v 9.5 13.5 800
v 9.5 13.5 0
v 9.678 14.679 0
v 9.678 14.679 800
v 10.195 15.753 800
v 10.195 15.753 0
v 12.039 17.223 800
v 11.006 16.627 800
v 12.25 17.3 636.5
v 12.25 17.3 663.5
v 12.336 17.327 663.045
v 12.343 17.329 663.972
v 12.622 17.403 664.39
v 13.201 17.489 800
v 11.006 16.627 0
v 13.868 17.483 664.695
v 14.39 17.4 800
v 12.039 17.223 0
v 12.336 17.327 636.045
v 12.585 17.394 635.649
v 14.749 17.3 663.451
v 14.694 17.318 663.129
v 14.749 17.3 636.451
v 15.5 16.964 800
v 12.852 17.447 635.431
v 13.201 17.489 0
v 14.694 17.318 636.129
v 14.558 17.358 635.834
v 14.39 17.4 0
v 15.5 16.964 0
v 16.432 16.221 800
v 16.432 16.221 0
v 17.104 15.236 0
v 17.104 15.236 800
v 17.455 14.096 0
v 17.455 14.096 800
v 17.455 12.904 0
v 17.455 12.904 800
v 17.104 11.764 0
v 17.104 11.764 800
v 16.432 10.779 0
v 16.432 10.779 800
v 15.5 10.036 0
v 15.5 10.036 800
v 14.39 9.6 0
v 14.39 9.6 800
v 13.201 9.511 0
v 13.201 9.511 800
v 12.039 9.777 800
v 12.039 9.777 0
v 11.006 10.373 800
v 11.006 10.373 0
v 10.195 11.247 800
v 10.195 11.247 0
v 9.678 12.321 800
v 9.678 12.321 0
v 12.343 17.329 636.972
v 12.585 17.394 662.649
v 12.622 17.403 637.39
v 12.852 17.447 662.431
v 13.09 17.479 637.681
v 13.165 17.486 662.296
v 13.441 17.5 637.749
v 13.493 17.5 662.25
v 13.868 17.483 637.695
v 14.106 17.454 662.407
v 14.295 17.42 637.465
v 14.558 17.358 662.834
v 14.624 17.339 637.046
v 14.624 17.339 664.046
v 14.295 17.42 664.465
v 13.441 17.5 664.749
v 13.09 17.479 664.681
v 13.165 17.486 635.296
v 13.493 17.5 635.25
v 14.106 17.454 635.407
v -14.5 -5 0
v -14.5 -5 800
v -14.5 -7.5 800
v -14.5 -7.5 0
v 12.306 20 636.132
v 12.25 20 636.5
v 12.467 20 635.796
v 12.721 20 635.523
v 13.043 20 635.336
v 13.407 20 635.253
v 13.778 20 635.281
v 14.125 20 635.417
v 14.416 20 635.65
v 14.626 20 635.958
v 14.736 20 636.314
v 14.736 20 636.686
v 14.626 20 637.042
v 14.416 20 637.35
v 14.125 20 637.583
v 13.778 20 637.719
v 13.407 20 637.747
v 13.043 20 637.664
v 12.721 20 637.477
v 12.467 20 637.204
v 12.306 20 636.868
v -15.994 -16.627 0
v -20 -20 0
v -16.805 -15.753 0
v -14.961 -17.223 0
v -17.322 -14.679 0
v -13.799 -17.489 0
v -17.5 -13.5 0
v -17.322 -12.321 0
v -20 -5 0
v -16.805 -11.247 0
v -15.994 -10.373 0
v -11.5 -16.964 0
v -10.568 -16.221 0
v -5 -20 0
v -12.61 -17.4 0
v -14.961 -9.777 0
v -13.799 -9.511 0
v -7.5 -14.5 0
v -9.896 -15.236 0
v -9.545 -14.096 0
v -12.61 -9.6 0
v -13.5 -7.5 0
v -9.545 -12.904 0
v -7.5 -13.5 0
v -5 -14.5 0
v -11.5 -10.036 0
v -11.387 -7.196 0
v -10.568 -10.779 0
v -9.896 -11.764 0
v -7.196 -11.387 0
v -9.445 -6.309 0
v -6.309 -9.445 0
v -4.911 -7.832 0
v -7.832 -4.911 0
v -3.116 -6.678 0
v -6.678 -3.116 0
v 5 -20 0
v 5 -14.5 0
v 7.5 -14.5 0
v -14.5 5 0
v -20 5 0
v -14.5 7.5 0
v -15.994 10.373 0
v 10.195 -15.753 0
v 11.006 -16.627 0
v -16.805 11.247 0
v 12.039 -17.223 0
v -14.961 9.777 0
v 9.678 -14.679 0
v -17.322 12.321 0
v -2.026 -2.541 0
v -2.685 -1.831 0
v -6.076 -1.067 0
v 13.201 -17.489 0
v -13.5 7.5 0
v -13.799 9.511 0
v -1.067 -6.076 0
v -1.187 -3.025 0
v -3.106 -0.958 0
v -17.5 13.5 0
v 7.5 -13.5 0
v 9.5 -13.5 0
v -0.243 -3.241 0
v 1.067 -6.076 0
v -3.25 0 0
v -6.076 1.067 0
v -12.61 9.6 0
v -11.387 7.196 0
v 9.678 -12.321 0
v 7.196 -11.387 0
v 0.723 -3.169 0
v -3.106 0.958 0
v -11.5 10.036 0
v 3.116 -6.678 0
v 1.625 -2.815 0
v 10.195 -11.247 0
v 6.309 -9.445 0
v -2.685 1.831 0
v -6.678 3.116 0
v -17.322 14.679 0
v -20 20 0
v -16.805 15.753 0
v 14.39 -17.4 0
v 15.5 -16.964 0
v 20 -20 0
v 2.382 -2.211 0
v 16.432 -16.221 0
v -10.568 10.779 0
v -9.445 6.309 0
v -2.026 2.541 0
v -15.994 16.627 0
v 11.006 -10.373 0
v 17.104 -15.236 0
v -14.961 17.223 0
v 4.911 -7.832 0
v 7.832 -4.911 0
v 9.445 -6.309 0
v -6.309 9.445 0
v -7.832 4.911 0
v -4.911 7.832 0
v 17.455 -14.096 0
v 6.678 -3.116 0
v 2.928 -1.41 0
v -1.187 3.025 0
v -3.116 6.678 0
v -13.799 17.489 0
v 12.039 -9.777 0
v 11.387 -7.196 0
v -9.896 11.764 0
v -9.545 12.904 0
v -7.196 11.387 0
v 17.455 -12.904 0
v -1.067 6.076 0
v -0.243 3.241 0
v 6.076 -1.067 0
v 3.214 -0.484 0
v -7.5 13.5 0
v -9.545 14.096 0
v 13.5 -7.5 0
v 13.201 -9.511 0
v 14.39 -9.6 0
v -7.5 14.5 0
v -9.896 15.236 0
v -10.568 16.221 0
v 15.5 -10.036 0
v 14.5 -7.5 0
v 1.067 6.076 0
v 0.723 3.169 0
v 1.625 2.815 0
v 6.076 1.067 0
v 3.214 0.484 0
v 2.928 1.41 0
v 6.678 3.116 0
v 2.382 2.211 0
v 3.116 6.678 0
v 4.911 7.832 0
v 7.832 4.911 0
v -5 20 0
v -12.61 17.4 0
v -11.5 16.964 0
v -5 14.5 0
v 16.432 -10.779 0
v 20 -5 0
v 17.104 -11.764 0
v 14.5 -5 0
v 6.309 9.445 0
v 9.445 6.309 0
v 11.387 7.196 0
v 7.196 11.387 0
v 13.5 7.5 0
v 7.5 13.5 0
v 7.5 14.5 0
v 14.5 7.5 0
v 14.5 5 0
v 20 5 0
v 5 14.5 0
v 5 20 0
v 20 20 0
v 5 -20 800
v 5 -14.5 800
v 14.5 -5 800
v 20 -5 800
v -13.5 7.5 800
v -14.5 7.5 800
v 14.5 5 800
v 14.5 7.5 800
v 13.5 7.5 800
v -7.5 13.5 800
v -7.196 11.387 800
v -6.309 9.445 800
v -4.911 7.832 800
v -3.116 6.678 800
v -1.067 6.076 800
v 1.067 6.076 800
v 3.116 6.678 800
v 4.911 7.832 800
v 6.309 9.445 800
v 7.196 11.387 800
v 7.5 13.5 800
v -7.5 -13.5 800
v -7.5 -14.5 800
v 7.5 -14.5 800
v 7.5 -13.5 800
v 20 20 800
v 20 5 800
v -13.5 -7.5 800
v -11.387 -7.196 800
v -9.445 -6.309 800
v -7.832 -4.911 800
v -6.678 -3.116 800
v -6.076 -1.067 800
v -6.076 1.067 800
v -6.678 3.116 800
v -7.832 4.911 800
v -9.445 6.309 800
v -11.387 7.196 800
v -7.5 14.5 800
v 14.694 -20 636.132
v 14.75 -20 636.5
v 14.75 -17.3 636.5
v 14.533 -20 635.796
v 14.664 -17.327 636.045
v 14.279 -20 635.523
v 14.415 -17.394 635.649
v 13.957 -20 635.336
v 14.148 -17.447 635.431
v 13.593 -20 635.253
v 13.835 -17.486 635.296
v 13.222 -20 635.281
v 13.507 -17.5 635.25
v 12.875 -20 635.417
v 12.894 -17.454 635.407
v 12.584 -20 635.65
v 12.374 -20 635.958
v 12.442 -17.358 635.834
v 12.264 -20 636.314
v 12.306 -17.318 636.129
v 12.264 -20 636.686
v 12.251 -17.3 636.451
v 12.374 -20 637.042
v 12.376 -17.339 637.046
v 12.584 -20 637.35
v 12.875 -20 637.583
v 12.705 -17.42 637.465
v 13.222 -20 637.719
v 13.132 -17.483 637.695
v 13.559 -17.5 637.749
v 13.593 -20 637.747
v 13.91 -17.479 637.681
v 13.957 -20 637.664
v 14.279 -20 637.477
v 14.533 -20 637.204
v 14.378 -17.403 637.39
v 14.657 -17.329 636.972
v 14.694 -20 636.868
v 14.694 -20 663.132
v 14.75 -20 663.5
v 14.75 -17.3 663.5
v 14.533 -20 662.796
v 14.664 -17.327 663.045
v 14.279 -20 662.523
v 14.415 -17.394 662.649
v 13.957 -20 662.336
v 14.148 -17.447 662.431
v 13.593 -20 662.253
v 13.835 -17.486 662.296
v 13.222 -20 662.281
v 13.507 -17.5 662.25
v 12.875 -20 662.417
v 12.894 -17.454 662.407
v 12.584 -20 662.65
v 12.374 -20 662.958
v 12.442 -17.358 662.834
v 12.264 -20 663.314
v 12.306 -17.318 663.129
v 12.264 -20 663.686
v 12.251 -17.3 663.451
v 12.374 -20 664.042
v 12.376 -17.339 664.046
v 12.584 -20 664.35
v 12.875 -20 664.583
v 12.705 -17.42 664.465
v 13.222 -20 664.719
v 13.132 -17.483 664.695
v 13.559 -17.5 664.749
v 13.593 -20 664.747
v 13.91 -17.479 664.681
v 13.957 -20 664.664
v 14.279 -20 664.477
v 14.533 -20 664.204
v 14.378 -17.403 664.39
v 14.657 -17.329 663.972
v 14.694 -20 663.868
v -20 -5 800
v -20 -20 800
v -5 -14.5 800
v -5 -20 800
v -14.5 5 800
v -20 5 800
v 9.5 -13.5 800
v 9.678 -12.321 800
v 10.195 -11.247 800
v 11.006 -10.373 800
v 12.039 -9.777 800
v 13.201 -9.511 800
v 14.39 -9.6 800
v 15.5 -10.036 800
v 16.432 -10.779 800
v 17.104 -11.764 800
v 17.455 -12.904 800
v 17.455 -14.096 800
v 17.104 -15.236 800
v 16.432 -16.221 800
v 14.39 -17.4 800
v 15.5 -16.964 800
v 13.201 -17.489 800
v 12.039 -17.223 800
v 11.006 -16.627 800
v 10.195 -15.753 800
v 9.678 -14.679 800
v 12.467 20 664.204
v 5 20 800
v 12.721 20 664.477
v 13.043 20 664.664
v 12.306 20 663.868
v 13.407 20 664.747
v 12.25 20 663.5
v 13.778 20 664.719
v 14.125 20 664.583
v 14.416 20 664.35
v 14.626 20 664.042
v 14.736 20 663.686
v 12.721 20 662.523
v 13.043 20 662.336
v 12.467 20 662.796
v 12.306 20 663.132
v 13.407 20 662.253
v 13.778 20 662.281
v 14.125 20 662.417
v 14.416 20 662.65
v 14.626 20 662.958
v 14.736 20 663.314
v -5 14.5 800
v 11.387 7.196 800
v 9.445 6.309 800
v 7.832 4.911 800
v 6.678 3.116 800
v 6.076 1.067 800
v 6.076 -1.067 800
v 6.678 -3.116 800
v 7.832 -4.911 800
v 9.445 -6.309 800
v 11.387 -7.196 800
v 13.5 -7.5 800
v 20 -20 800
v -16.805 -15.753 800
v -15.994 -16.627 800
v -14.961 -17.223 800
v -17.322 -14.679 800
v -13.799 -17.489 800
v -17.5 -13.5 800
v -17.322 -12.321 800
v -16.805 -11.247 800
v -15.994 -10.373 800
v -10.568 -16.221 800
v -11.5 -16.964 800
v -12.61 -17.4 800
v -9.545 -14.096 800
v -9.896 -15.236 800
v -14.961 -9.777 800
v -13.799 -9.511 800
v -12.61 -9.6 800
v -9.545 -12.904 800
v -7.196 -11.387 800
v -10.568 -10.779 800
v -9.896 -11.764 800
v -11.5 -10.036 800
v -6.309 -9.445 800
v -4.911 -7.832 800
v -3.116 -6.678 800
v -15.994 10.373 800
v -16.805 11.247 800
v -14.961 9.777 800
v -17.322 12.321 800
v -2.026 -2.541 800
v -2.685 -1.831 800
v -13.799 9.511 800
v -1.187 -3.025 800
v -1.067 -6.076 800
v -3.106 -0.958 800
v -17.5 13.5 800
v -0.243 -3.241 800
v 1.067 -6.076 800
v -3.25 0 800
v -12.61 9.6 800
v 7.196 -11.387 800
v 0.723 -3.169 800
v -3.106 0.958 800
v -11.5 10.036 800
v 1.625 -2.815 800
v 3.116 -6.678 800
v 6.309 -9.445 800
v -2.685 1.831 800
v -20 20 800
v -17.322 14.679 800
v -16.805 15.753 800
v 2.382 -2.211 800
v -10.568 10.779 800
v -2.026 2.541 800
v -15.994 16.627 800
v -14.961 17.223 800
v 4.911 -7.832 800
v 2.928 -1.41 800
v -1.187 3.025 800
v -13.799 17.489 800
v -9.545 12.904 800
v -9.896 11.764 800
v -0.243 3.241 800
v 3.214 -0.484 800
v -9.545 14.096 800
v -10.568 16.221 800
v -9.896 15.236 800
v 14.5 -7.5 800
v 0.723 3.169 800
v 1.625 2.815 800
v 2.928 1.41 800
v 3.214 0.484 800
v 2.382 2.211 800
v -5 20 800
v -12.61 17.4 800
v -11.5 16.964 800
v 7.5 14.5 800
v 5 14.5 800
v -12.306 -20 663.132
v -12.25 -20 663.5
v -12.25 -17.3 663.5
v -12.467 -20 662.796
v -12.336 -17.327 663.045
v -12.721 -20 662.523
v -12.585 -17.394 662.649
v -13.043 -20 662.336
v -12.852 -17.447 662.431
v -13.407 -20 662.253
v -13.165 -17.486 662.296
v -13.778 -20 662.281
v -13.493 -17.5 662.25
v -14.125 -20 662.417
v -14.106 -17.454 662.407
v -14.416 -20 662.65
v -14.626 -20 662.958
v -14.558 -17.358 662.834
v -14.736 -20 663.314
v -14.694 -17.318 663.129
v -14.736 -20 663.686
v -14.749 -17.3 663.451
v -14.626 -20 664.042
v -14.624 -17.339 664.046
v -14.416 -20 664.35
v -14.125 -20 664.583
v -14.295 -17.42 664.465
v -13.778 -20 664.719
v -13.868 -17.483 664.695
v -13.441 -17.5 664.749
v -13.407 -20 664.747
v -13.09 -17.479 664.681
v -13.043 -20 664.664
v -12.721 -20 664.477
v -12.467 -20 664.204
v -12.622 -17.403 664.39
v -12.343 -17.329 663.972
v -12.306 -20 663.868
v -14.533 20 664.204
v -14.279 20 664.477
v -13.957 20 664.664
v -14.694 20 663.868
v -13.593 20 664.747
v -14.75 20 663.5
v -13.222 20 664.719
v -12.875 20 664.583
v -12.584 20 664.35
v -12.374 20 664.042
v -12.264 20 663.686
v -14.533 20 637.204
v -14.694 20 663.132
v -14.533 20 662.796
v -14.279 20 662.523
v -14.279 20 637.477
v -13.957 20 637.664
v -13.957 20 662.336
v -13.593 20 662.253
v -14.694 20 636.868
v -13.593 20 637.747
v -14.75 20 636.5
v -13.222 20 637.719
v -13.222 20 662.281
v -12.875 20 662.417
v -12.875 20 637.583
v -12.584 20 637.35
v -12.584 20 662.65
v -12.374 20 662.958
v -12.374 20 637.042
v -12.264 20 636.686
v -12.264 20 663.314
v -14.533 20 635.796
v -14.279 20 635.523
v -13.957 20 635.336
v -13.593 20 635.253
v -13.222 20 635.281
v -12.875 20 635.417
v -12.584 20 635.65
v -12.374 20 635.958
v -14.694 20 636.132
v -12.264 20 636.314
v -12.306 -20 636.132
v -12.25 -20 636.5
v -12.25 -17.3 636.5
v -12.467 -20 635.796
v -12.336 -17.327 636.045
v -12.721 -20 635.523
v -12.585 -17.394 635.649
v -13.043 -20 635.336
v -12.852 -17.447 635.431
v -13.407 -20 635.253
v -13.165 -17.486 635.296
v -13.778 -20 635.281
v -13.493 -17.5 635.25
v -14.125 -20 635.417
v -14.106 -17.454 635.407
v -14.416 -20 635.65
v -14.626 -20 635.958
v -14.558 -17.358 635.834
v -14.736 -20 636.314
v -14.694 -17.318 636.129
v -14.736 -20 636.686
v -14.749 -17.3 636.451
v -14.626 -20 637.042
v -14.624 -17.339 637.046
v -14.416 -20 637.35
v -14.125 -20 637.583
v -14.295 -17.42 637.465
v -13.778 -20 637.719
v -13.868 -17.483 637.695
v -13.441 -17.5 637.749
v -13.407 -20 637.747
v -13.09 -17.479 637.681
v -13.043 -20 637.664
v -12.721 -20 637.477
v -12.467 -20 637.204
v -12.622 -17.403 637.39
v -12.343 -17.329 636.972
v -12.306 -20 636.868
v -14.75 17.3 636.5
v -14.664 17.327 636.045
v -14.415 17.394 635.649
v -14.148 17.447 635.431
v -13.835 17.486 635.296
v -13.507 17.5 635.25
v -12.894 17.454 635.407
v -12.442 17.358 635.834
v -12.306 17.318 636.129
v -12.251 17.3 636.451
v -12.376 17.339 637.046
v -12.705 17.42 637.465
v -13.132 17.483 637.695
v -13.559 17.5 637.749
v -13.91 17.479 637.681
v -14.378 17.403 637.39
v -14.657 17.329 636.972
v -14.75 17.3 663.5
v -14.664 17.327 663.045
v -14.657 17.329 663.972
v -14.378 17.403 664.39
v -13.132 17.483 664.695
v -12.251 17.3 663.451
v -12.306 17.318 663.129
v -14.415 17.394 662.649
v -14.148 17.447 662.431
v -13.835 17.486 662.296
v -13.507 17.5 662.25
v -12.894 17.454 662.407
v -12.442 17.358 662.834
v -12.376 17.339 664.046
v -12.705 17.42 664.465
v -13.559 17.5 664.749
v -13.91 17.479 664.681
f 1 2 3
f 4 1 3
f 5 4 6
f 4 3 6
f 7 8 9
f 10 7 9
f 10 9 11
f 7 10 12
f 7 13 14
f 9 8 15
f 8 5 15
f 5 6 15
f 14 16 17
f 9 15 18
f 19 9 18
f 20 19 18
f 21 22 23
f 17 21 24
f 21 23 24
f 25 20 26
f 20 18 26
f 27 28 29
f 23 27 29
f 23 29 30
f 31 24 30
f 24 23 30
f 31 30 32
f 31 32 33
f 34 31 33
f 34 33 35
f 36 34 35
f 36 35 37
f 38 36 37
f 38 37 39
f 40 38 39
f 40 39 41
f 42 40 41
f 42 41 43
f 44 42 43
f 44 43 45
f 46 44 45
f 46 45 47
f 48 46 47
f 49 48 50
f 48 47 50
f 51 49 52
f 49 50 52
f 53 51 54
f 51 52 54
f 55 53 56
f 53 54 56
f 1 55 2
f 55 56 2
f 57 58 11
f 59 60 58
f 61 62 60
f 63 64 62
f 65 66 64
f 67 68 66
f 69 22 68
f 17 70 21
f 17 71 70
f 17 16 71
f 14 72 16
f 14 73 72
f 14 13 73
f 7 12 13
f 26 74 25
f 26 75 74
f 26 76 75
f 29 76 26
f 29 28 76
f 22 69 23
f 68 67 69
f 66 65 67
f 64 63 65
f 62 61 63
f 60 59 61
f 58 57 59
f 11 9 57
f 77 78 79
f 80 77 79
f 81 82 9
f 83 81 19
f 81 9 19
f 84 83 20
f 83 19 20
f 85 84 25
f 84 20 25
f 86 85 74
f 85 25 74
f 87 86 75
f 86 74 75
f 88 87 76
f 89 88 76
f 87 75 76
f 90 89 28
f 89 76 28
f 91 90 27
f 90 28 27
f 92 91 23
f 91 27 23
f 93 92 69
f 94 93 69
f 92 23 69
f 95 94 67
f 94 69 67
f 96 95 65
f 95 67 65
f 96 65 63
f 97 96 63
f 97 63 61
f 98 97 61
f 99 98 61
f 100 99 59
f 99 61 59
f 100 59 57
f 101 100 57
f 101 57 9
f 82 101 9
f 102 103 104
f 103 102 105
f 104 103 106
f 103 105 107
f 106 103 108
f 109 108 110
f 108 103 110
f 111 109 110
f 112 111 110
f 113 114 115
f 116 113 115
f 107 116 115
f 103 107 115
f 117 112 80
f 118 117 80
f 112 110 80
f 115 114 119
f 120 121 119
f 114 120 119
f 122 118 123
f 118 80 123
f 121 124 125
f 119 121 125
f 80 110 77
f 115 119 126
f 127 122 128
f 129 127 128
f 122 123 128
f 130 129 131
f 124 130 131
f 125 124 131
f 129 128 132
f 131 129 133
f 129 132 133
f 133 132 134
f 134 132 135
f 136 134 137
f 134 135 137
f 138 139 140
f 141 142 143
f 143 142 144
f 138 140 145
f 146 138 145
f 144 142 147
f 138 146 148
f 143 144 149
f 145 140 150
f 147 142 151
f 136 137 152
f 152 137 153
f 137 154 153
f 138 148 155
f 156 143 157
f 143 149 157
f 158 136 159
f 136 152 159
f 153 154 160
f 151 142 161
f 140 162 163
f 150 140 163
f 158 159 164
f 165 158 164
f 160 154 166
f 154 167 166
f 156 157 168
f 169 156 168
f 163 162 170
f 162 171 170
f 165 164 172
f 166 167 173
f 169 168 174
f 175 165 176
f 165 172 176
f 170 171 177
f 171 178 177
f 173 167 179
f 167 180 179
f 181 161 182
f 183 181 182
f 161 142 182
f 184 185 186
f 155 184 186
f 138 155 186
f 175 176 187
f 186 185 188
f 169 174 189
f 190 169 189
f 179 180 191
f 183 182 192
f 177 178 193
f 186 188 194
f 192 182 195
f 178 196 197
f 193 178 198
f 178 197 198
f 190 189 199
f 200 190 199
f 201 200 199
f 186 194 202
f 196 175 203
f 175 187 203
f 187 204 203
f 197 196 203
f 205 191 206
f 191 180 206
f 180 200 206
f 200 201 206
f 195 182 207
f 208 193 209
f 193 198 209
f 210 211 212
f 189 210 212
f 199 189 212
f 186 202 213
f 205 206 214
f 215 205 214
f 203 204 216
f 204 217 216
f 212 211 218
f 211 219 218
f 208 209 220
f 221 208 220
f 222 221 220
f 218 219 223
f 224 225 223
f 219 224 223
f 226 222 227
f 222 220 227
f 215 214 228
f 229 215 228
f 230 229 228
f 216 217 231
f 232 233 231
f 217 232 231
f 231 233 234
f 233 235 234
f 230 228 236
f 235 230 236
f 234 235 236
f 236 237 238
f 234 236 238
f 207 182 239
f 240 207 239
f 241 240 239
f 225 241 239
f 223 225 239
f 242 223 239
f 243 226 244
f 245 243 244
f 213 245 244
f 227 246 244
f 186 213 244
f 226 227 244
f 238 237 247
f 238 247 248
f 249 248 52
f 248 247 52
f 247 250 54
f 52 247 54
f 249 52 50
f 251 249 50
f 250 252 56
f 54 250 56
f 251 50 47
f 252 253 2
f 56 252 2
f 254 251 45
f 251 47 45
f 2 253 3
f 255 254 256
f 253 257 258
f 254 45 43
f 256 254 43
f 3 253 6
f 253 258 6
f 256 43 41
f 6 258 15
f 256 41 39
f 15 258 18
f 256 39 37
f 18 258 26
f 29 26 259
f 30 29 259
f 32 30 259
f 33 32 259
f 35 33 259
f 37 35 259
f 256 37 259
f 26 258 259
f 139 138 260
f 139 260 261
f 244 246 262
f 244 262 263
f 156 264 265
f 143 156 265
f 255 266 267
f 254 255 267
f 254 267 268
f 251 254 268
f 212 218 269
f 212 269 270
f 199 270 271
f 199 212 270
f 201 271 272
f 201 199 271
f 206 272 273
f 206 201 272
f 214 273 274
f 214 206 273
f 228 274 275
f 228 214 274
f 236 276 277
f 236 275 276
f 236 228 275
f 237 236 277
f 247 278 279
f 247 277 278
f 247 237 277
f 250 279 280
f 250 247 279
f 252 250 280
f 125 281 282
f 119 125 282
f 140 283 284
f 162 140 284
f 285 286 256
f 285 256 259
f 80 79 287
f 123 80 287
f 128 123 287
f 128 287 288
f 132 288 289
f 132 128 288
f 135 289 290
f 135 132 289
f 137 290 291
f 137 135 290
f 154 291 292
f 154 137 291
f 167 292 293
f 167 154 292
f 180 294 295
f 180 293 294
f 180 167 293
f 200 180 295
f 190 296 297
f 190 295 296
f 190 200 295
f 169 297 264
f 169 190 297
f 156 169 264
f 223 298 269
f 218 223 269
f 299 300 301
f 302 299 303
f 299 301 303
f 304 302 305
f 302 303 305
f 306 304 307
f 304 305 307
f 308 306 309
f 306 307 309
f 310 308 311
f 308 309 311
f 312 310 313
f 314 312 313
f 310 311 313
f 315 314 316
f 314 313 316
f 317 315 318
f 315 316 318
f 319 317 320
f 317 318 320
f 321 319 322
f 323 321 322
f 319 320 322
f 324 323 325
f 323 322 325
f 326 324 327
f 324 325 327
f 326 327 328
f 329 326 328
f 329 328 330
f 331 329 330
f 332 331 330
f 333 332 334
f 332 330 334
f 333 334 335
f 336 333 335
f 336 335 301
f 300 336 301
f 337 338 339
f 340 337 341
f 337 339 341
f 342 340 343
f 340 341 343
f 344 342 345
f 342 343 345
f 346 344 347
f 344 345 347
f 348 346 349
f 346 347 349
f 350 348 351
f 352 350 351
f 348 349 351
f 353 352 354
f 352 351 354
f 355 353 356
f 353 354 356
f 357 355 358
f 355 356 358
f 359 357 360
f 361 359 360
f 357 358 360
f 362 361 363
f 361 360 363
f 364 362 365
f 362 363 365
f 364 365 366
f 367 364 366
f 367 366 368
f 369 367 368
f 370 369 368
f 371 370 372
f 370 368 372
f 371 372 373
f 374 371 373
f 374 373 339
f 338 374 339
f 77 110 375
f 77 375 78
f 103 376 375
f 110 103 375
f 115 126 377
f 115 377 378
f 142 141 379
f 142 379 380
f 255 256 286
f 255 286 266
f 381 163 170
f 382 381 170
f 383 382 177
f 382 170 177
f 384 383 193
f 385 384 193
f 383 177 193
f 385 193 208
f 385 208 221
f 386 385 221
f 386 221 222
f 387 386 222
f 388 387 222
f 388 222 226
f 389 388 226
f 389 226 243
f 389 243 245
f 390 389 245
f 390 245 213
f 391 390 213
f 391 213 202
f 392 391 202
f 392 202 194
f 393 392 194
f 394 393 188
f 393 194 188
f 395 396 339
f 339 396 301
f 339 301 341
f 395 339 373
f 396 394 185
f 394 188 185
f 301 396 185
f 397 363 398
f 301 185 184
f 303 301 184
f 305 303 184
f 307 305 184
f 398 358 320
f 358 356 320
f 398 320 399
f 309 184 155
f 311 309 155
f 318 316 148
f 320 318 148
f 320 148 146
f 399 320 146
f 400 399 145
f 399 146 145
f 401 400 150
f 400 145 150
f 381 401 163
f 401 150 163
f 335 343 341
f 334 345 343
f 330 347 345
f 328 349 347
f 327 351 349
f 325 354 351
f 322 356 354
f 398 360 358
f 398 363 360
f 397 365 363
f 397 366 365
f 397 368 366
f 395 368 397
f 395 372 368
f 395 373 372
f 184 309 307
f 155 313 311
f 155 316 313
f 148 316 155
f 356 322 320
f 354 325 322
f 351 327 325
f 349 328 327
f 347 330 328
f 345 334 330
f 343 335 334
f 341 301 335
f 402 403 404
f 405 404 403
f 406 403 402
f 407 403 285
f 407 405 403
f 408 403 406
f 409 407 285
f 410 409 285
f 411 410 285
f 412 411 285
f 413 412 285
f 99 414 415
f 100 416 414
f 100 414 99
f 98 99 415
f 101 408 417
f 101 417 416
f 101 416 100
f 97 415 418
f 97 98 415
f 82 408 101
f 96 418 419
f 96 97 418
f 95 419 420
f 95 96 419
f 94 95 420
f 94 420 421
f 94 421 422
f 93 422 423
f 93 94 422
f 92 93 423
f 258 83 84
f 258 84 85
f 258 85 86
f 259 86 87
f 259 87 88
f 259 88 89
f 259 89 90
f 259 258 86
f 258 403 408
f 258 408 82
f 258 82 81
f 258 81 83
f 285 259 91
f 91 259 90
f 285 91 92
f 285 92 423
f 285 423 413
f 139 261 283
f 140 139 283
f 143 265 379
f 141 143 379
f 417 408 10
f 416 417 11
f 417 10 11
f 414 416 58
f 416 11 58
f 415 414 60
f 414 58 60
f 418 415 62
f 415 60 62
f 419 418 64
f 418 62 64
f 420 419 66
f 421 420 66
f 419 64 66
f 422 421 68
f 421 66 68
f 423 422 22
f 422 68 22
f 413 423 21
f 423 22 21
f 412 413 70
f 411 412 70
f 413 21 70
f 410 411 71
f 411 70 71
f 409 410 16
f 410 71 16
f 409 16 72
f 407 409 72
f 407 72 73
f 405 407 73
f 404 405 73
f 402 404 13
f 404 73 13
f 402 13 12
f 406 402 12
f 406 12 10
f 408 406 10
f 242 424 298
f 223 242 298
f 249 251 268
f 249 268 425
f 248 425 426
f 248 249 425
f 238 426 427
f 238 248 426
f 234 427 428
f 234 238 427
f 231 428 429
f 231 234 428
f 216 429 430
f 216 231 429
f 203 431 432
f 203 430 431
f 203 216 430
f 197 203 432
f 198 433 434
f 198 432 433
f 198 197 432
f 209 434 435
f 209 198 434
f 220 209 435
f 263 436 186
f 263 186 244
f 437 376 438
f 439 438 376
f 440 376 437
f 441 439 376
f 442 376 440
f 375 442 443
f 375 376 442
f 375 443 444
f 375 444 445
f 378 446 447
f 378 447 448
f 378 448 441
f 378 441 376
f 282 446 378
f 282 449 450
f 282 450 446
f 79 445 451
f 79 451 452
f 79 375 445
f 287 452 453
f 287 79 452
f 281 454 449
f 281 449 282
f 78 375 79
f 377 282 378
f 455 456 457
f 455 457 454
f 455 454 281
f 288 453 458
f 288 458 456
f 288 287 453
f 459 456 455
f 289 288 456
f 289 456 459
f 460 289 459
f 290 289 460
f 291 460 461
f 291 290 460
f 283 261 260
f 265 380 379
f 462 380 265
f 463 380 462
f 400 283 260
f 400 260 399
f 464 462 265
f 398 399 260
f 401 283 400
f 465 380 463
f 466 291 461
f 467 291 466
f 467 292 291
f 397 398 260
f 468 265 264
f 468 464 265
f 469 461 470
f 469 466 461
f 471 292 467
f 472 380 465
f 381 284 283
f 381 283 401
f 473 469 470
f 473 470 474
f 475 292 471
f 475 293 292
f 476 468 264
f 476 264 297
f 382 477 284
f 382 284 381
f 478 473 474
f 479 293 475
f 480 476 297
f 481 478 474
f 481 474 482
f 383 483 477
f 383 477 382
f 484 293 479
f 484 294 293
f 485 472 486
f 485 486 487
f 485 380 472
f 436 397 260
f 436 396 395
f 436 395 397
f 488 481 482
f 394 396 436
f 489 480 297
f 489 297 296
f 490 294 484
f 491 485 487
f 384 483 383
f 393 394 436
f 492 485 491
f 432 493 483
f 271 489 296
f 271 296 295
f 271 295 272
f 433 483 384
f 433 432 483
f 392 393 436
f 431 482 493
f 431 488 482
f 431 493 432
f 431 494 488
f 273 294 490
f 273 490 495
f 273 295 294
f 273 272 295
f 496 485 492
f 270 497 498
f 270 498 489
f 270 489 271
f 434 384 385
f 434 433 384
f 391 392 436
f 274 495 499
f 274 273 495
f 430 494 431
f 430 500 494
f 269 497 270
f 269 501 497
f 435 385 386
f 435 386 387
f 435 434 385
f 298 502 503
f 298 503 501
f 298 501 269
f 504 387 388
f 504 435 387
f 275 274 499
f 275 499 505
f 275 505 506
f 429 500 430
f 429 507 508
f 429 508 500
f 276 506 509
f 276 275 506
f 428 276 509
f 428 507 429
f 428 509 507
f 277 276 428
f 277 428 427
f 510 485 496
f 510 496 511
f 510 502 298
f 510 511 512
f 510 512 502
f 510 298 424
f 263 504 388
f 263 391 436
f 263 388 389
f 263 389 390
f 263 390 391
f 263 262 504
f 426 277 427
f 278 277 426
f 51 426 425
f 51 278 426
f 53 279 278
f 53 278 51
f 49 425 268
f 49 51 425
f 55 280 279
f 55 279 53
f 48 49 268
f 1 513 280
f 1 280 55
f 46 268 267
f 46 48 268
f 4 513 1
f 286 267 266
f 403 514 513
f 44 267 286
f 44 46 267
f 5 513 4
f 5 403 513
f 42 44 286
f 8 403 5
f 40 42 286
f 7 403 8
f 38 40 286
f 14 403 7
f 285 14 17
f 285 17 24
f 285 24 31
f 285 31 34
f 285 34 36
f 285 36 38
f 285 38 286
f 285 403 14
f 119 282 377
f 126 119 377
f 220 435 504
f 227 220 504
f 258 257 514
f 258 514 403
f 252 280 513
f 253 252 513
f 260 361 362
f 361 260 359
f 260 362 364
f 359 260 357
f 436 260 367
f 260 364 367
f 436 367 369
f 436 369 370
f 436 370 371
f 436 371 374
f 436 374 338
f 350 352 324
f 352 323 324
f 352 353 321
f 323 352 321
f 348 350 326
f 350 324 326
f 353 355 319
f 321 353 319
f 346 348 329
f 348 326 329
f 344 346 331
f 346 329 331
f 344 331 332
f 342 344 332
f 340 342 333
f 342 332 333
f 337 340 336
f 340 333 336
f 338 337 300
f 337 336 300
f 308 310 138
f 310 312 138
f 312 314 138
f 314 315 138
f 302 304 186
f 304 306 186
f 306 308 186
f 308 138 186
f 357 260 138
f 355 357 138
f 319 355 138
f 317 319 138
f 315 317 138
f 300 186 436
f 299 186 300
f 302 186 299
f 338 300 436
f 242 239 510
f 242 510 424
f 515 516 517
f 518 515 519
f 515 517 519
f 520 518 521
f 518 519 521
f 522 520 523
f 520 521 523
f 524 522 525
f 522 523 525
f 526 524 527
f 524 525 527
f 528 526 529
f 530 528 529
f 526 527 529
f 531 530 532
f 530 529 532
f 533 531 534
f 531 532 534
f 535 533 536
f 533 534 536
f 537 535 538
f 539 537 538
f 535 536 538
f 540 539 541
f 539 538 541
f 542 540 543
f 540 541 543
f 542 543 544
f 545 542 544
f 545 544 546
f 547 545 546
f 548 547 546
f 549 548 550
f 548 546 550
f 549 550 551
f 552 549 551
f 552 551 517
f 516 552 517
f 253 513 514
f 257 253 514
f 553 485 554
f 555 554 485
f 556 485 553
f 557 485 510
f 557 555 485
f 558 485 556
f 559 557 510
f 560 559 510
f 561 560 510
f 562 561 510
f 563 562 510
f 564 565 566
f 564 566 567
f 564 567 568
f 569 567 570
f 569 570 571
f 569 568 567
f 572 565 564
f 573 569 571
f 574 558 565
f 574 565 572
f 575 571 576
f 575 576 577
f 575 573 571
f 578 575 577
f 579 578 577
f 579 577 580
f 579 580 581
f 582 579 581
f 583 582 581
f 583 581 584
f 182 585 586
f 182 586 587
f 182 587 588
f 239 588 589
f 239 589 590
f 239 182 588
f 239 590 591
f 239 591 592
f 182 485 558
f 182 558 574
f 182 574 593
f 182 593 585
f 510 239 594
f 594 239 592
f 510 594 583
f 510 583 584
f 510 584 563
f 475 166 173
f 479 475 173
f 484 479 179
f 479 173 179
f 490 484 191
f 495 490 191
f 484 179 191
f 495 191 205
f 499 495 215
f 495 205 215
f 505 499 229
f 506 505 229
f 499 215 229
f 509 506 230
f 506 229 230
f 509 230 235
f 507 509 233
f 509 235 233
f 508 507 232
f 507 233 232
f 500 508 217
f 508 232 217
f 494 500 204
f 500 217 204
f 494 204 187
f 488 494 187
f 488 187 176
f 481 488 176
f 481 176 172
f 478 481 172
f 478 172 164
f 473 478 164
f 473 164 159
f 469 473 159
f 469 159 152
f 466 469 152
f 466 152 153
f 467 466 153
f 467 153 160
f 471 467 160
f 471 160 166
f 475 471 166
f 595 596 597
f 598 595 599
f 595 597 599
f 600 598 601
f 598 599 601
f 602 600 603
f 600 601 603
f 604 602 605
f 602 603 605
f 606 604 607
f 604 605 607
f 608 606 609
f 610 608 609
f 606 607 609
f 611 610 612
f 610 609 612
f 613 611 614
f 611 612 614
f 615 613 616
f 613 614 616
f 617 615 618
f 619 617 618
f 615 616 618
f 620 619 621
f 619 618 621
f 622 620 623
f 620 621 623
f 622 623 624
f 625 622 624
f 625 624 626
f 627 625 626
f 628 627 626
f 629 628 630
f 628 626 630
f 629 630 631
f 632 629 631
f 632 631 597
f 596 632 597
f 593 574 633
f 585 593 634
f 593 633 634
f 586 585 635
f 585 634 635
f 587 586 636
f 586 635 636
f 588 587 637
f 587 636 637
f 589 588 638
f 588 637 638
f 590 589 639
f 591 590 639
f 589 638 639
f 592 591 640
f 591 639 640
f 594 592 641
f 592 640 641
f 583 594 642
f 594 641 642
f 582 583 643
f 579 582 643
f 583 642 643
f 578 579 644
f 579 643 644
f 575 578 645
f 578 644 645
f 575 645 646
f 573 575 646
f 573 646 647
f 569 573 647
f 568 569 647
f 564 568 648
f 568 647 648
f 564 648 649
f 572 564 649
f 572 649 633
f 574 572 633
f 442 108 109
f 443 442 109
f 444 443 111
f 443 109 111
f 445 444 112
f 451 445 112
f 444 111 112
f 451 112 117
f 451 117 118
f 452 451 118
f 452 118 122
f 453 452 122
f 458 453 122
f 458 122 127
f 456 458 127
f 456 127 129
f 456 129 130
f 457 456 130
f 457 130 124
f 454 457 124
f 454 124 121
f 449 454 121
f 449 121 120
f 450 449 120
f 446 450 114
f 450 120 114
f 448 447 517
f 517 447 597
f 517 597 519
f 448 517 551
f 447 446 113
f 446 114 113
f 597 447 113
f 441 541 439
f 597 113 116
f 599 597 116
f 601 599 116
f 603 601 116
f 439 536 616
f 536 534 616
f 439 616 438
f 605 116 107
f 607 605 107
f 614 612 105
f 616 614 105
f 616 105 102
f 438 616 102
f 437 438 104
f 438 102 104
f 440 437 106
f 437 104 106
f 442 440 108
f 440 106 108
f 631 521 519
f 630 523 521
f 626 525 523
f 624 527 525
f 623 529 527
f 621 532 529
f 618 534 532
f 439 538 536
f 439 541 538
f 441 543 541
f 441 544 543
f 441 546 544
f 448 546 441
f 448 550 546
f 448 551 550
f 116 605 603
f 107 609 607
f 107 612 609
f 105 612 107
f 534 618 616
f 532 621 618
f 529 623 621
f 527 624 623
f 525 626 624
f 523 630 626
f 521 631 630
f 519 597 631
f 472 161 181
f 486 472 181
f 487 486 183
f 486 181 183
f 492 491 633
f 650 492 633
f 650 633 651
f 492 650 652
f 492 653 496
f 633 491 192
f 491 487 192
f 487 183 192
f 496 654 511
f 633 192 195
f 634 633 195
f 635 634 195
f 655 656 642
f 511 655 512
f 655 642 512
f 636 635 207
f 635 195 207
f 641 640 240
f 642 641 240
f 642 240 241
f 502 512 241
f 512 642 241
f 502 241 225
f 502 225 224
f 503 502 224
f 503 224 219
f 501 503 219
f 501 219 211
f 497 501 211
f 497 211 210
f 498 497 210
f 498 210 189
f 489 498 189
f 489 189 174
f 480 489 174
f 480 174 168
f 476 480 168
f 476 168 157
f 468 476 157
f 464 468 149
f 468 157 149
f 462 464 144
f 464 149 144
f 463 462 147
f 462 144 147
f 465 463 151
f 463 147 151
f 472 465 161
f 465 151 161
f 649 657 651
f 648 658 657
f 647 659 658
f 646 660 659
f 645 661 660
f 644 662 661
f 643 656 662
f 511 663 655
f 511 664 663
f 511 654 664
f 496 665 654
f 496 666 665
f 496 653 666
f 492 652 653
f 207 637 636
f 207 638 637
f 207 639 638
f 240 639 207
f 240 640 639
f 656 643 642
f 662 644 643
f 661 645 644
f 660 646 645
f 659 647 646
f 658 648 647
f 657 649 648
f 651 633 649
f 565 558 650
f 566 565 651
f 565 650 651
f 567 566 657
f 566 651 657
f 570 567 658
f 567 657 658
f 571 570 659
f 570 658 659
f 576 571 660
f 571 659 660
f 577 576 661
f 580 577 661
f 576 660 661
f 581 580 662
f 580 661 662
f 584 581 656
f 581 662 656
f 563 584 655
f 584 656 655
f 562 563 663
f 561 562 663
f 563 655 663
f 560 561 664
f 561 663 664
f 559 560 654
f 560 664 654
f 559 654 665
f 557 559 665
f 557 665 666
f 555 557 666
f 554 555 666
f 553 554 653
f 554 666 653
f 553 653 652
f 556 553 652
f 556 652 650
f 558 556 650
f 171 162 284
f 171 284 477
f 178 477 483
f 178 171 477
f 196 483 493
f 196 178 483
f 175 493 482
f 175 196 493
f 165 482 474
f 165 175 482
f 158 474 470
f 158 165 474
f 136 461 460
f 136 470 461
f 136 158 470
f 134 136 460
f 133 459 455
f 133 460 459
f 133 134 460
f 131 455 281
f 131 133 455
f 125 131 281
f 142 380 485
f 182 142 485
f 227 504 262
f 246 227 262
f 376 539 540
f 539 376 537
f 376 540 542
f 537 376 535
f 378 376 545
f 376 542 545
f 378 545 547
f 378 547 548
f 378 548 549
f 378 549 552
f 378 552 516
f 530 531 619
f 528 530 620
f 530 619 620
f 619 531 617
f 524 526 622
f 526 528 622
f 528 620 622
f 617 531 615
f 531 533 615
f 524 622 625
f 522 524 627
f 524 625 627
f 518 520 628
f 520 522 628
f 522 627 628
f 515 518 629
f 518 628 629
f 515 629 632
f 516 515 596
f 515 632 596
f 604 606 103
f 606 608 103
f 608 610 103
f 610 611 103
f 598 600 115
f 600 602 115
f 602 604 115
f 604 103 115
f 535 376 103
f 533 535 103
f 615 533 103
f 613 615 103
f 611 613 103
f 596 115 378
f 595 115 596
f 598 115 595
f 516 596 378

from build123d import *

# Parameters (mm, degrees)
SKETCH_1_W          = 40
SKETCH_1_H          = 40
EXTRUDE_1_DEPTH     = 800
SKETCH_2_R          = 3.25
SKETCH_2_R_2        = 4
CUT_EXTRUDE_1_DEPTH = 801
M3X0_5_1_D          = 2.5
M3X0_5_1_DEPTH      = 7.5
M3X0_5_1_TIP        = 0.751075774
M3X0_5_2_D          = 2.5
M3X0_5_2_DEPTH      = 7.5
M3X0_5_2_TIP        = 0.751075774


with BuildPart() as part:
    # 草圖1 → 伸長1 (new body)
    with BuildSketch(Plane.XY):
        Rectangle(SKETCH_1_W, SKETCH_1_H)
    extrude(amount=EXTRUDE_1_DEPTH)

    # 草圖2 → 除料-伸長1 (cut, through all)
    with BuildSketch(Plane(origin=(0, 0, 0), x_dir=(-1, 0, 0), z_dir=(0, 0, -1))):
        Circle(SKETCH_2_R)
        with Locations((-13.5, 13.5)):
            Circle(SKETCH_2_R_2)
        with Locations((13.5, 13.5)):
            Circle(SKETCH_2_R_2)
        with Locations((-13.5, -13.5)):
            Circle(SKETCH_2_R_2)
        with Locations((13.5, -13.5)):
            Circle(SKETCH_2_R_2)
        with BuildLine():
            Line((5, 14.5), (7.5, 14.5))
            Line((7.5, 14.5), (7.5, 13.5))
            ThreePointArc((7.5, 13.5), (0, 6), (-7.5, 13.5))
            Line((-7.5, 13.5), (-7.5, 14.5))
            Line((-7.5, 14.5), (-5, 14.5))
            Line((-5, 14.5), (-5, 20))
            Line((-5, 20), (5, 20))
            Line((5, 20), (5, 14.5))
        make_face()
        with BuildLine():
            Line((14.5, -5), (14.5, -7.5))
            Line((14.5, -7.5), (13.5, -7.5))
            ThreePointArc((13.5, -7.5), (6, 0), (13.5, 7.5))
            Line((13.5, 7.5), (14.5, 7.5))
            Line((14.5, 7.5), (14.5, 5))
            Line((14.5, 5), (20, 5))
            Line((20, 5), (20, -5))
            Line((20, -5), (14.5, -5))
        make_face()
        with BuildLine():
            Line((-5, -14.5), (-7.5, -14.5))
            Line((-7.5, -14.5), (-7.5, -13.5))
            ThreePointArc((-7.5, -13.5), (0, -6), (7.5, -13.5))
            Line((7.5, -13.5), (7.5, -14.5))
            Line((7.5, -14.5), (5, -14.5))
            Line((5, -14.5), (5, -20))
            Line((5, -20), (-5, -20))
            Line((-5, -20), (-5, -14.5))
        make_face()
        with BuildLine():
            Line((-14.5, 5), (-14.5, 7.5))
            Line((-14.5, 7.5), (-13.5, 7.5))
            ThreePointArc((-13.5, 7.5), (-6, 0), (-13.5, -7.5))
            Line((-13.5, -7.5), (-14.5, -7.5))
            Line((-14.5, -7.5), (-14.5, -5))
            Line((-14.5, -5), (-20, -5))
            Line((-20, -5), (-20, 5))
            Line((-20, 5), (-14.5, 5))
        make_face()
    extrude(amount=-CUT_EXTRUDE_1_DEPTH, mode=Mode.SUBTRACT)

    # M3x0.5 螺紋孔1
    with Locations(Plane(origin=(0, 20, 0), x_dir=(1, 0, 0), z_dir=(0, 1, 0))):
        with Locations((13.5, -663.5), (13.5, -636.5), (-13.5, -636.5), (-13.5, -663.5)):
            Hole(M3X0_5_1_D / 2, depth=M3X0_5_1_DEPTH)
            with Locations((0, 0, -(M3X0_5_1_DEPTH + M3X0_5_1_TIP / 2))):  # 118° drill point
                Cone(0, M3X0_5_1_D / 2, M3X0_5_1_TIP, mode=Mode.SUBTRACT)

    # M3x0.5 螺紋孔2
    with Locations(Plane(origin=(0, -20, 0), x_dir=(-1, 0, 0), z_dir=(0, -1, 0))):
        with Locations((13.5, -636.5), (13.5, -663.5), (-13.5, -663.5), (-13.5, -636.5)):
            Hole(M3X0_5_2_D / 2, depth=M3X0_5_2_DEPTH)
            with Locations((0, 0, -(M3X0_5_2_DEPTH + M3X0_5_2_TIP / 2))):  # 118° drill point
                Cone(0, M3X0_5_2_D / 2, M3X0_5_2_TIP, mode=Mode.SUBTRACT)


solid = part.part
